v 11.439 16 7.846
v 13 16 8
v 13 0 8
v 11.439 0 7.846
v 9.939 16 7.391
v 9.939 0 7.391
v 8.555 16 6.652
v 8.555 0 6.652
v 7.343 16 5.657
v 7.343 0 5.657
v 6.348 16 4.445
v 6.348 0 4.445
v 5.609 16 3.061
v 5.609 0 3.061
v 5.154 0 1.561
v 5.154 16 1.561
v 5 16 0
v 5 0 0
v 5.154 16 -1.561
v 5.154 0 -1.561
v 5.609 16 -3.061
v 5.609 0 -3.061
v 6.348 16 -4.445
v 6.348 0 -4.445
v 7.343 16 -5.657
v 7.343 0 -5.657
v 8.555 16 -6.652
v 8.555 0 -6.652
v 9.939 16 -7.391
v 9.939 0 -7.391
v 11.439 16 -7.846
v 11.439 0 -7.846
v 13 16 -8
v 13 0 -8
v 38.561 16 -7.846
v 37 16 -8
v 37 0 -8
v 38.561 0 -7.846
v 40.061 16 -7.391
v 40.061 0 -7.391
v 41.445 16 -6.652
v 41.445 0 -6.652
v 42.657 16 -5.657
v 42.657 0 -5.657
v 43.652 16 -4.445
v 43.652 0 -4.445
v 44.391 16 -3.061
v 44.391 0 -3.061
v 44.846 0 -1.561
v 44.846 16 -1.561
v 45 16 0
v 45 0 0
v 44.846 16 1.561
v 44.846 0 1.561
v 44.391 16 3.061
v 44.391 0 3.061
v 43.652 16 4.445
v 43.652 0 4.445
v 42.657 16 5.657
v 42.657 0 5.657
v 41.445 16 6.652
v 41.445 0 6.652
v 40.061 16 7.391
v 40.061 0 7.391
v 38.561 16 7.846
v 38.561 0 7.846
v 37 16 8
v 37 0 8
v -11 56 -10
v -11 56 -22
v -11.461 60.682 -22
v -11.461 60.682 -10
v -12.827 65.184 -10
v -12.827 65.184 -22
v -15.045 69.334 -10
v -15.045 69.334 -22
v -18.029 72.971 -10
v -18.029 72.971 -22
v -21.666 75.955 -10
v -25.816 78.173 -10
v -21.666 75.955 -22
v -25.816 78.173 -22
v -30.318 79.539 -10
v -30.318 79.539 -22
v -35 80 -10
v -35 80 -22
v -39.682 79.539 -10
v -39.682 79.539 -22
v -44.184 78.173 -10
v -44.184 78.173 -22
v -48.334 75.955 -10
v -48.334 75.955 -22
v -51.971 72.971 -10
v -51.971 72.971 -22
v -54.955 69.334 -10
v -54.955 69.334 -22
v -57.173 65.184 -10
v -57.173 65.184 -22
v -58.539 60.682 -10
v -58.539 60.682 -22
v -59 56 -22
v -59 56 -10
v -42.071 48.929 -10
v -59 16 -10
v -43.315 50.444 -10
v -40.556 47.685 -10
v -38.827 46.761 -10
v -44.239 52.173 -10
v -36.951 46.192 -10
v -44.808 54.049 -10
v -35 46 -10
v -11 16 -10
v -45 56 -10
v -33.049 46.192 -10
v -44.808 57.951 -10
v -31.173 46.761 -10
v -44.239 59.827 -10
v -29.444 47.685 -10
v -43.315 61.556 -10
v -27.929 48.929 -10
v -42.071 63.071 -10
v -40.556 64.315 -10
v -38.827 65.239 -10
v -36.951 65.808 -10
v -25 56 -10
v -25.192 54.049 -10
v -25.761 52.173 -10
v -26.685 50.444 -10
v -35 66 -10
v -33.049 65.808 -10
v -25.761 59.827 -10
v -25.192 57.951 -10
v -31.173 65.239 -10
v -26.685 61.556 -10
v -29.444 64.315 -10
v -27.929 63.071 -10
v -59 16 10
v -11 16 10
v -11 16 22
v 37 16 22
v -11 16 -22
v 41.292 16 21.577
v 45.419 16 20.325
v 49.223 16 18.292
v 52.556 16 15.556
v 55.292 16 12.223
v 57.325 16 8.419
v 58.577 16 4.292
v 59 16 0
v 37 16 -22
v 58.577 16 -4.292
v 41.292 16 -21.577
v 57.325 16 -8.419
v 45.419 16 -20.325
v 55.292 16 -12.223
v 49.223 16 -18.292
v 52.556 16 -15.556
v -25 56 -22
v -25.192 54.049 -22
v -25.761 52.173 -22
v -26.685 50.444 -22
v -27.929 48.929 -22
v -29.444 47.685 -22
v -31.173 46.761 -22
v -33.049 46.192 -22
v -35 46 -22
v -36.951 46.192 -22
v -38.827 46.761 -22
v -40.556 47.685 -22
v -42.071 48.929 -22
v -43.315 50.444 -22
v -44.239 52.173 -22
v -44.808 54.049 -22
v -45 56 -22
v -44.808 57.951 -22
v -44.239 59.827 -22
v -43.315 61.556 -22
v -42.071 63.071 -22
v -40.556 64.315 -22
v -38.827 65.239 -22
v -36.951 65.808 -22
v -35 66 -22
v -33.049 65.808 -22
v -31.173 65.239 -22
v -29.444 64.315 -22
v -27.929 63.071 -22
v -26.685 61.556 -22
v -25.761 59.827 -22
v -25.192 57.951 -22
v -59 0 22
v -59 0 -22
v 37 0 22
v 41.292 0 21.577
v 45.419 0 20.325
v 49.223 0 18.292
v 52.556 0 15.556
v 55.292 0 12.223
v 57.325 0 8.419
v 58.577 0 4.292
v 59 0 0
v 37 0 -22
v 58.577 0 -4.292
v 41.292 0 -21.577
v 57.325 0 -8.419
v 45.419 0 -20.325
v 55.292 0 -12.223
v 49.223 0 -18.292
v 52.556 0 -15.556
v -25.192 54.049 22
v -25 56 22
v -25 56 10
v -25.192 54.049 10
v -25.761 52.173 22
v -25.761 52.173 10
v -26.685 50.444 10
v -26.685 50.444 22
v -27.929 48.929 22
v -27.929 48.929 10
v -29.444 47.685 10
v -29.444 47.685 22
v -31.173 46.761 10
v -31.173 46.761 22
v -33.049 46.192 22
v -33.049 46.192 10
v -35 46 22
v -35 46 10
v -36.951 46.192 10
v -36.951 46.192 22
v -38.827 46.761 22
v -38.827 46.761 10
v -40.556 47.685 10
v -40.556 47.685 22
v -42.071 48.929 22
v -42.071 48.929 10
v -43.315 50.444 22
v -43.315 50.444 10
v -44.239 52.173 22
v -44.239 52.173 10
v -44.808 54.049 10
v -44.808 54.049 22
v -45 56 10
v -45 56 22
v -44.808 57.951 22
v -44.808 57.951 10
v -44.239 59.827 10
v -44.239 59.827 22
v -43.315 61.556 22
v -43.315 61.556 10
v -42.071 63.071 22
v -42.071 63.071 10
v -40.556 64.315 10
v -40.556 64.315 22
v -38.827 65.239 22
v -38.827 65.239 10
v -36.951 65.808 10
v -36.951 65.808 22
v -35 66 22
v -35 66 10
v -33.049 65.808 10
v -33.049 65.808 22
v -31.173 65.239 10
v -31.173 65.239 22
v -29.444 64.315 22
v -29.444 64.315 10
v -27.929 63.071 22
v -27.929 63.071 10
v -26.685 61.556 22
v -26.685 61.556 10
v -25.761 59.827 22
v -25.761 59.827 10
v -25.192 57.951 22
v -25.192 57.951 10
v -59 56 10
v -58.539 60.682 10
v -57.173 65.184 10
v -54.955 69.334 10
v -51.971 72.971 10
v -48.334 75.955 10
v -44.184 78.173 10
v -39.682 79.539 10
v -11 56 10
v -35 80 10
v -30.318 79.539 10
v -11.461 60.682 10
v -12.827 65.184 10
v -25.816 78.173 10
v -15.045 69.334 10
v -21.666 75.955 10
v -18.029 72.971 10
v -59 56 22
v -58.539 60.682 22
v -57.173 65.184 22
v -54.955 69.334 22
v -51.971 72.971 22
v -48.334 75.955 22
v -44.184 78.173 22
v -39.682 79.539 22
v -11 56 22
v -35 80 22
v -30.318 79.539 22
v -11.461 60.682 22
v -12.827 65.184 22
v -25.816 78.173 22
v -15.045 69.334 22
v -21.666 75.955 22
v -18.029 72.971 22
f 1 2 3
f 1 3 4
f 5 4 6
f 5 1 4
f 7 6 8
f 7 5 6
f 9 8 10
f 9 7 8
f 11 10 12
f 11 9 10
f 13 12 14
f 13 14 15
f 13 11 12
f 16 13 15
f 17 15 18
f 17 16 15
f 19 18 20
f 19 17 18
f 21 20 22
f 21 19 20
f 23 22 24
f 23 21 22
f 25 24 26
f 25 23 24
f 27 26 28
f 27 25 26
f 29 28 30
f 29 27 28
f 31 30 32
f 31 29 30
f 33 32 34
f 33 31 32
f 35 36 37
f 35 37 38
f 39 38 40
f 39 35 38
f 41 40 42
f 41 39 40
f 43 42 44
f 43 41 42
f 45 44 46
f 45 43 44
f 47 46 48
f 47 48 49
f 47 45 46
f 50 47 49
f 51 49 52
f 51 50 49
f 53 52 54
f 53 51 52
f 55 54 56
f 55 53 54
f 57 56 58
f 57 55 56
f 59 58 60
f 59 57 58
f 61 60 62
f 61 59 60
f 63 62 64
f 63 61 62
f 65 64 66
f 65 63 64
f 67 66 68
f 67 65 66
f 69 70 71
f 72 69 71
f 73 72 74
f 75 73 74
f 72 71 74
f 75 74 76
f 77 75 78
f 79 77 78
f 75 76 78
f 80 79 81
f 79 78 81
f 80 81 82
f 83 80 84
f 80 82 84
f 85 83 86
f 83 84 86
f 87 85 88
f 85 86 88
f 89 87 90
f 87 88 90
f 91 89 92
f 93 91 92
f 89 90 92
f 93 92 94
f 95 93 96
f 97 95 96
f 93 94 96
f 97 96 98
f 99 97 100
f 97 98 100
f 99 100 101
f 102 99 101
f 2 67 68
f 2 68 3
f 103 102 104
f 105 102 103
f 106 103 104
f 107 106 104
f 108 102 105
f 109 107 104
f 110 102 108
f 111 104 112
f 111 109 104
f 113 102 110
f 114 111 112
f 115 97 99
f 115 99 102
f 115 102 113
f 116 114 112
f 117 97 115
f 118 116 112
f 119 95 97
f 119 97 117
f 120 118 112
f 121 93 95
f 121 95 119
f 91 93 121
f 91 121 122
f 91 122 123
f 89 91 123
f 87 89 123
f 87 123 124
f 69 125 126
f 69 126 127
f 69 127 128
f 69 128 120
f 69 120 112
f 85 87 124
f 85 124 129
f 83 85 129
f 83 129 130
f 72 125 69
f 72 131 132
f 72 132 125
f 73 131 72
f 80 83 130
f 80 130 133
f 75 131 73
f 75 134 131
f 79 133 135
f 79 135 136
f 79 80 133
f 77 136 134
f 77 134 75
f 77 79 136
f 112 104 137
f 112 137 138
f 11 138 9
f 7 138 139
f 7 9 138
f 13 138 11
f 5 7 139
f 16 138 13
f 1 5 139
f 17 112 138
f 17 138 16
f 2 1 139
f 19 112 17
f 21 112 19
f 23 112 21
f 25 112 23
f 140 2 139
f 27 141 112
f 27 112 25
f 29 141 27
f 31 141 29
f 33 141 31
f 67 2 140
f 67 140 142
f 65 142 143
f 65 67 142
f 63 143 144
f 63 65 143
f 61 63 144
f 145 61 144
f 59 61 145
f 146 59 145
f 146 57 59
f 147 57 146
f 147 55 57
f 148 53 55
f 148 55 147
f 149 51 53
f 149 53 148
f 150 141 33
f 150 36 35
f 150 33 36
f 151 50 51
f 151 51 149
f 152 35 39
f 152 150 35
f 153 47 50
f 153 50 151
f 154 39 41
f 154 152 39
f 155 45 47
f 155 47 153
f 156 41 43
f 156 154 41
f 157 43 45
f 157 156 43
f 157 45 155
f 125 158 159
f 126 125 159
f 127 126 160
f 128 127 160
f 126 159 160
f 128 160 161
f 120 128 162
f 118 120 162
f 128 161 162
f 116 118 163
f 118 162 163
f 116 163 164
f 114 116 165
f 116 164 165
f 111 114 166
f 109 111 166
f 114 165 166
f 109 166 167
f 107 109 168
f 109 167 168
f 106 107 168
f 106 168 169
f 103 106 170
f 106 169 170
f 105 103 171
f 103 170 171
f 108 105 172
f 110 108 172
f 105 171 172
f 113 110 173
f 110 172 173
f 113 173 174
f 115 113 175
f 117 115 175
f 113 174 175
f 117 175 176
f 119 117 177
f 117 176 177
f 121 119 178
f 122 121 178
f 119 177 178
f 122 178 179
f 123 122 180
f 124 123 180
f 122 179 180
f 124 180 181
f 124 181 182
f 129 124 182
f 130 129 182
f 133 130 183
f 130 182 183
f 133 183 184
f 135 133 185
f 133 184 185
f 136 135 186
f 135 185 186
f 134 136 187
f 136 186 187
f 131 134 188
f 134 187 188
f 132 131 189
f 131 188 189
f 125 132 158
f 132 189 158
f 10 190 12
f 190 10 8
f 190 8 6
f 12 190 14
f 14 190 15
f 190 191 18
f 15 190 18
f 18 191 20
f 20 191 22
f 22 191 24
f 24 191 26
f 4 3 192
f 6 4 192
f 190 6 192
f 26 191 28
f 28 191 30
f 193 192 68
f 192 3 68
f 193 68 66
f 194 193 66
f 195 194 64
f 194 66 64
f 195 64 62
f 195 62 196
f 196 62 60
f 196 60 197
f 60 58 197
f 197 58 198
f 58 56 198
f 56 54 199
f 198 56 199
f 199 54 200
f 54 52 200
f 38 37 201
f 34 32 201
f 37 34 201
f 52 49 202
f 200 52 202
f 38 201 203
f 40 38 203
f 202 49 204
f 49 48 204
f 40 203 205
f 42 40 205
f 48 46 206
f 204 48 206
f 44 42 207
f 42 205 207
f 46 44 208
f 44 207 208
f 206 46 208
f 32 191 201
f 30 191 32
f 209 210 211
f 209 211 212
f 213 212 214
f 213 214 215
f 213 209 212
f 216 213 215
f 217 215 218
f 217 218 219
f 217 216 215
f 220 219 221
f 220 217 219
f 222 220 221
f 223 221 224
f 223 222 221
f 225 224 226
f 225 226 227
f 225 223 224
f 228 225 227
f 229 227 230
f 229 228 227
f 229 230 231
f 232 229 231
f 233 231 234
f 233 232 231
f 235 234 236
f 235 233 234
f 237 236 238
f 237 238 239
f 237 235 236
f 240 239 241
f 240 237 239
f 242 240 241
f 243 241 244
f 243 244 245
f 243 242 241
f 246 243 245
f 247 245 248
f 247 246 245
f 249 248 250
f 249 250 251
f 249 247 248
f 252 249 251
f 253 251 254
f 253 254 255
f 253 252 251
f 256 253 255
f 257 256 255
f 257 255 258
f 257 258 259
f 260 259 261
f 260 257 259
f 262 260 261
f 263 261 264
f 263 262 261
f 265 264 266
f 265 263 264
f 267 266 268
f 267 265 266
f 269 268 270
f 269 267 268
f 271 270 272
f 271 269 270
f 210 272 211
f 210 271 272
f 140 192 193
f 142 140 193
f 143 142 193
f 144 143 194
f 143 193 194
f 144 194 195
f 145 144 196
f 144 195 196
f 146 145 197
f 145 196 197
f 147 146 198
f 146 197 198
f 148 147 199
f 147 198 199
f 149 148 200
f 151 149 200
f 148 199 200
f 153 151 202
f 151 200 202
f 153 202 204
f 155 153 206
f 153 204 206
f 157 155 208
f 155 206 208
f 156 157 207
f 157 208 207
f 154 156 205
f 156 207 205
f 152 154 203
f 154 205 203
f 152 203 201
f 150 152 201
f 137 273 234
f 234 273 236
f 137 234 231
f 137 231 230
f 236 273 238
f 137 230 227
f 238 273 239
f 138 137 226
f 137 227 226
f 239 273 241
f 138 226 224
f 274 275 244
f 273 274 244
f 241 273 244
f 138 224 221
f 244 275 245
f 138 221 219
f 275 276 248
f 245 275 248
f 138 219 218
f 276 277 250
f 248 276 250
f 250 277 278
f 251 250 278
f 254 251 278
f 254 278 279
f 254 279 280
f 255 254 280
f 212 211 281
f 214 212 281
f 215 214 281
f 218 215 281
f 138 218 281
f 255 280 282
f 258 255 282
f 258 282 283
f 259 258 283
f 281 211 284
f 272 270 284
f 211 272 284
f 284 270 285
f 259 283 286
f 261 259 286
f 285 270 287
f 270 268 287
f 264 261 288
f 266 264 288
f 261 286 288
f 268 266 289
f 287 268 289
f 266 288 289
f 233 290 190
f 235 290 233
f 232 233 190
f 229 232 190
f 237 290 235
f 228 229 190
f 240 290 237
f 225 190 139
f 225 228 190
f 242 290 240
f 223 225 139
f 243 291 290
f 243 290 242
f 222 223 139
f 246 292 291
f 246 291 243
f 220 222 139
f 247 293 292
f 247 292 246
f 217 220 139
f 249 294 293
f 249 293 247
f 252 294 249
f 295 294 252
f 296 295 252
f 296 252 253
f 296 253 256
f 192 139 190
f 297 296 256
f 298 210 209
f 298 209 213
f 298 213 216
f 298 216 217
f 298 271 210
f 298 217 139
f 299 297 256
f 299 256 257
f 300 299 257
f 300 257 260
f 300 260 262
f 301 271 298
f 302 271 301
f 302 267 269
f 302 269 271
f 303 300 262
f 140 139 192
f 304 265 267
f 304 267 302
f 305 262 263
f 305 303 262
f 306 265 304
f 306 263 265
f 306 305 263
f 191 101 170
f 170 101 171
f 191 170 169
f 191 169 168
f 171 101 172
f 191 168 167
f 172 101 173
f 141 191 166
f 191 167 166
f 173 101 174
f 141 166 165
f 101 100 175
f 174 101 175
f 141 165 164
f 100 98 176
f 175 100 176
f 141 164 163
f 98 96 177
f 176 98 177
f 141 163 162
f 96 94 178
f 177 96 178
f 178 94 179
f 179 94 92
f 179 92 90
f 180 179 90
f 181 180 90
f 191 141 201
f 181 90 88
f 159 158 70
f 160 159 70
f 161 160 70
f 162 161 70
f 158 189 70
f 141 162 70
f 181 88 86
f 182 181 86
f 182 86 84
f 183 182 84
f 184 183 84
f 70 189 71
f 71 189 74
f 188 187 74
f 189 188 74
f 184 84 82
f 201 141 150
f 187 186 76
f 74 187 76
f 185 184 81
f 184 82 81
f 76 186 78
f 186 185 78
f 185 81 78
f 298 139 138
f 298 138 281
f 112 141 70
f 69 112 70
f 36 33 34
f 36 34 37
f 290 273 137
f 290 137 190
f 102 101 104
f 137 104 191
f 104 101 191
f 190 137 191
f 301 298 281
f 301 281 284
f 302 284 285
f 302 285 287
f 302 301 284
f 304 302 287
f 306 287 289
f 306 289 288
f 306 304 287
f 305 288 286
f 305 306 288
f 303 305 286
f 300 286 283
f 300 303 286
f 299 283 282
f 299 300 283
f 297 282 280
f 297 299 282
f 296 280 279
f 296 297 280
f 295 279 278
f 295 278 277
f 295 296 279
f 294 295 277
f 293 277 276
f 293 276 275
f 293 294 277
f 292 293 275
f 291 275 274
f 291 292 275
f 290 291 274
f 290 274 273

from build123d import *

# Parameters (mm, degrees)
SKETCH1_R           = 22
BOSS_EXTRUDE1_DEPTH = 16
CUT_EXTRUDE2_DEPTH  = 16
BOSS_EXTRUDE2_DEPTH = 12


with BuildPart() as part:
    # Sketch1 → Boss-Extrude1 (new body)
    with BuildSketch(Plane(origin=(0, 0, 0), x_dir=(1, 0, 0), z_dir=(0, 1, 0))):
        with BuildLine():
            Line((37.000000064, 22), (-59, 22))
            Line((-59, 22), (-59, -22))
            Line((-59, -22), (37, -22))
            ThreePointArc((37, -22), (15, 3.2e-08), (37.000000064, 22))
        make_face()
        with Locations((37, 0)):
            Circle(SKETCH1_R)
    extrude(amount=BOSS_EXTRUDE1_DEPTH)

    # Sketch5 → Cut-Extrude2 (cut)
    with BuildSketch(Plane(origin=(0, 16, 0), x_dir=(1, 0, 0), z_dir=(0, 1, 0))):
        with BuildLine():
            Line((37, -8), (13, -8))
            ThreePointArc((13, -8), (5, 0), (13, 8))
            Line((13, 8), (37, 8))
            ThreePointArc((37, 8), (45, 0), (37, -8))
        make_face()
    extrude(amount=-CUT_EXTRUDE2_DEPTH, mode=Mode.SUBTRACT)

    # Sketch6 → Boss-Extrude2 (add)
    with BuildSketch(Plane.XY.offset(22)):
        with BuildLine():
            Line((-59, 56), (-59, 16))
            Line((-59, 16), (-11, 16))
            Line((-11, 16), (-11, 56))
            ThreePointArc((-11, 56), (-35, 32), (-59, 56))
        make_face()
        with BuildLine():
            ThreePointArc((-11, 56), (-35, 80), (-59, 56))
            Line((-59, 56), (-45, 56))
            ThreePointArc((-45, 56), (-35, 66), (-25, 56))
            Line((-25, 56), (-11, 56))
        make_face()
        with BuildLine():
            Line((-45, 56), (-59, 56))
            ThreePointArc((-59, 56), (-35, 32), (-11, 56))
            Line((-11, 56), (-25, 56))
            ThreePointArc((-25, 56), (-35, 46), (-45, 56))
        make_face()
    boss_extrude2 = extrude(amount=-BOSS_EXTRUDE2_DEPTH)

    # Mirror1: Boss-Extrude2 across plane
    add(boss_extrude2.mirror(Plane.XY))


solid = part.part
